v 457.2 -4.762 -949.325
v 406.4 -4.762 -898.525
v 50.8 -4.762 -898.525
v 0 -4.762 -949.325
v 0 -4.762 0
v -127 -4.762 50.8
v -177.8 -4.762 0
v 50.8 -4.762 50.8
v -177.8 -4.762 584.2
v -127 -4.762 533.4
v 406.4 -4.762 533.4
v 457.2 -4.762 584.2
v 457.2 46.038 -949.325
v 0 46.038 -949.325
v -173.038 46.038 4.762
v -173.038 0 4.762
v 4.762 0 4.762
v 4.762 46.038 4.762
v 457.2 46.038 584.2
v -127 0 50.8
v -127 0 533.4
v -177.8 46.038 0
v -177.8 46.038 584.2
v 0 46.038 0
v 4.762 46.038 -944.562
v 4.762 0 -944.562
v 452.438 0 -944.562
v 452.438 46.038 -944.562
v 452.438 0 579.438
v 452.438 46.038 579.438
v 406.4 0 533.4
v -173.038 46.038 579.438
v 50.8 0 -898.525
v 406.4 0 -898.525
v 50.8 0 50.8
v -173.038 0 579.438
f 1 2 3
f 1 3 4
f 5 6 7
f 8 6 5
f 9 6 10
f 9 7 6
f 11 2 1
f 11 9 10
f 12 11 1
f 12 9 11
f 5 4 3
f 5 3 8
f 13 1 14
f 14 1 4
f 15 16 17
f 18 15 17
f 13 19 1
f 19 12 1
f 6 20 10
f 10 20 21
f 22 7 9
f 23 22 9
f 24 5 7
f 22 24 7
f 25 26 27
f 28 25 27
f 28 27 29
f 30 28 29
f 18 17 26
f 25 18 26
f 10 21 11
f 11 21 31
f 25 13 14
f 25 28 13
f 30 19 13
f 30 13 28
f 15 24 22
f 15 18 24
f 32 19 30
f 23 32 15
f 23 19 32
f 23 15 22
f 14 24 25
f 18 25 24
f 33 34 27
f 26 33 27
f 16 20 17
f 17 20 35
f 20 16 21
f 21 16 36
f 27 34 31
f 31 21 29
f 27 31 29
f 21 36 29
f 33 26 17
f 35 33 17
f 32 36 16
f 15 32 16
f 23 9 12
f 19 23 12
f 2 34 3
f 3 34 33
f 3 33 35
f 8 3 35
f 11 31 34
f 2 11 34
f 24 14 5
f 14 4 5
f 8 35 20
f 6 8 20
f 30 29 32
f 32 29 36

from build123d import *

# Parameters (mm, degrees)
F1_DEPTH = 4.7625
F3_DEPTH = 46.0375


with BuildPart() as f1:
    # F0 (on Front) → F1 (new body)
    with BuildSketch(Plane.XZ):
        Polygon((457.2, 584.2), (-177.8, 584.2), (-177.8, 0), (0, 0), (0, -949.325), (457.2, -949.325), align=None)
        Polygon((50.8, -898.525), (50.8, 50.8), (-127, 50.8), (-127, 533.4), (406.4, 533.4), (406.4, -898.525), align=None, mode=Mode.SUBTRACT)
    extrude(amount=F1_DEPTH)

    # F2 (on face) → F3 (join)
    with BuildSketch(Plane(origin=(0, 0, 0), x_dir=(-1, 0, 0), z_dir=(0, 1, 0))):
        Polygon((177.8, 584.2), (-457.2, 584.2), (-457.2, -949.325), (0, -949.325), (0, 0), (177.8, 0), align=None)
        Polygon((-4.7625, -944.5625), (-452.4375, -944.5625), (-452.4375, 579.4375), (173.0375, 579.4375), (173.0375, 4.7625), (-4.7625, 4.7625), align=None, mode=Mode.SUBTRACT)
    extrude(amount=F3_DEPTH)


solid = f1.part
